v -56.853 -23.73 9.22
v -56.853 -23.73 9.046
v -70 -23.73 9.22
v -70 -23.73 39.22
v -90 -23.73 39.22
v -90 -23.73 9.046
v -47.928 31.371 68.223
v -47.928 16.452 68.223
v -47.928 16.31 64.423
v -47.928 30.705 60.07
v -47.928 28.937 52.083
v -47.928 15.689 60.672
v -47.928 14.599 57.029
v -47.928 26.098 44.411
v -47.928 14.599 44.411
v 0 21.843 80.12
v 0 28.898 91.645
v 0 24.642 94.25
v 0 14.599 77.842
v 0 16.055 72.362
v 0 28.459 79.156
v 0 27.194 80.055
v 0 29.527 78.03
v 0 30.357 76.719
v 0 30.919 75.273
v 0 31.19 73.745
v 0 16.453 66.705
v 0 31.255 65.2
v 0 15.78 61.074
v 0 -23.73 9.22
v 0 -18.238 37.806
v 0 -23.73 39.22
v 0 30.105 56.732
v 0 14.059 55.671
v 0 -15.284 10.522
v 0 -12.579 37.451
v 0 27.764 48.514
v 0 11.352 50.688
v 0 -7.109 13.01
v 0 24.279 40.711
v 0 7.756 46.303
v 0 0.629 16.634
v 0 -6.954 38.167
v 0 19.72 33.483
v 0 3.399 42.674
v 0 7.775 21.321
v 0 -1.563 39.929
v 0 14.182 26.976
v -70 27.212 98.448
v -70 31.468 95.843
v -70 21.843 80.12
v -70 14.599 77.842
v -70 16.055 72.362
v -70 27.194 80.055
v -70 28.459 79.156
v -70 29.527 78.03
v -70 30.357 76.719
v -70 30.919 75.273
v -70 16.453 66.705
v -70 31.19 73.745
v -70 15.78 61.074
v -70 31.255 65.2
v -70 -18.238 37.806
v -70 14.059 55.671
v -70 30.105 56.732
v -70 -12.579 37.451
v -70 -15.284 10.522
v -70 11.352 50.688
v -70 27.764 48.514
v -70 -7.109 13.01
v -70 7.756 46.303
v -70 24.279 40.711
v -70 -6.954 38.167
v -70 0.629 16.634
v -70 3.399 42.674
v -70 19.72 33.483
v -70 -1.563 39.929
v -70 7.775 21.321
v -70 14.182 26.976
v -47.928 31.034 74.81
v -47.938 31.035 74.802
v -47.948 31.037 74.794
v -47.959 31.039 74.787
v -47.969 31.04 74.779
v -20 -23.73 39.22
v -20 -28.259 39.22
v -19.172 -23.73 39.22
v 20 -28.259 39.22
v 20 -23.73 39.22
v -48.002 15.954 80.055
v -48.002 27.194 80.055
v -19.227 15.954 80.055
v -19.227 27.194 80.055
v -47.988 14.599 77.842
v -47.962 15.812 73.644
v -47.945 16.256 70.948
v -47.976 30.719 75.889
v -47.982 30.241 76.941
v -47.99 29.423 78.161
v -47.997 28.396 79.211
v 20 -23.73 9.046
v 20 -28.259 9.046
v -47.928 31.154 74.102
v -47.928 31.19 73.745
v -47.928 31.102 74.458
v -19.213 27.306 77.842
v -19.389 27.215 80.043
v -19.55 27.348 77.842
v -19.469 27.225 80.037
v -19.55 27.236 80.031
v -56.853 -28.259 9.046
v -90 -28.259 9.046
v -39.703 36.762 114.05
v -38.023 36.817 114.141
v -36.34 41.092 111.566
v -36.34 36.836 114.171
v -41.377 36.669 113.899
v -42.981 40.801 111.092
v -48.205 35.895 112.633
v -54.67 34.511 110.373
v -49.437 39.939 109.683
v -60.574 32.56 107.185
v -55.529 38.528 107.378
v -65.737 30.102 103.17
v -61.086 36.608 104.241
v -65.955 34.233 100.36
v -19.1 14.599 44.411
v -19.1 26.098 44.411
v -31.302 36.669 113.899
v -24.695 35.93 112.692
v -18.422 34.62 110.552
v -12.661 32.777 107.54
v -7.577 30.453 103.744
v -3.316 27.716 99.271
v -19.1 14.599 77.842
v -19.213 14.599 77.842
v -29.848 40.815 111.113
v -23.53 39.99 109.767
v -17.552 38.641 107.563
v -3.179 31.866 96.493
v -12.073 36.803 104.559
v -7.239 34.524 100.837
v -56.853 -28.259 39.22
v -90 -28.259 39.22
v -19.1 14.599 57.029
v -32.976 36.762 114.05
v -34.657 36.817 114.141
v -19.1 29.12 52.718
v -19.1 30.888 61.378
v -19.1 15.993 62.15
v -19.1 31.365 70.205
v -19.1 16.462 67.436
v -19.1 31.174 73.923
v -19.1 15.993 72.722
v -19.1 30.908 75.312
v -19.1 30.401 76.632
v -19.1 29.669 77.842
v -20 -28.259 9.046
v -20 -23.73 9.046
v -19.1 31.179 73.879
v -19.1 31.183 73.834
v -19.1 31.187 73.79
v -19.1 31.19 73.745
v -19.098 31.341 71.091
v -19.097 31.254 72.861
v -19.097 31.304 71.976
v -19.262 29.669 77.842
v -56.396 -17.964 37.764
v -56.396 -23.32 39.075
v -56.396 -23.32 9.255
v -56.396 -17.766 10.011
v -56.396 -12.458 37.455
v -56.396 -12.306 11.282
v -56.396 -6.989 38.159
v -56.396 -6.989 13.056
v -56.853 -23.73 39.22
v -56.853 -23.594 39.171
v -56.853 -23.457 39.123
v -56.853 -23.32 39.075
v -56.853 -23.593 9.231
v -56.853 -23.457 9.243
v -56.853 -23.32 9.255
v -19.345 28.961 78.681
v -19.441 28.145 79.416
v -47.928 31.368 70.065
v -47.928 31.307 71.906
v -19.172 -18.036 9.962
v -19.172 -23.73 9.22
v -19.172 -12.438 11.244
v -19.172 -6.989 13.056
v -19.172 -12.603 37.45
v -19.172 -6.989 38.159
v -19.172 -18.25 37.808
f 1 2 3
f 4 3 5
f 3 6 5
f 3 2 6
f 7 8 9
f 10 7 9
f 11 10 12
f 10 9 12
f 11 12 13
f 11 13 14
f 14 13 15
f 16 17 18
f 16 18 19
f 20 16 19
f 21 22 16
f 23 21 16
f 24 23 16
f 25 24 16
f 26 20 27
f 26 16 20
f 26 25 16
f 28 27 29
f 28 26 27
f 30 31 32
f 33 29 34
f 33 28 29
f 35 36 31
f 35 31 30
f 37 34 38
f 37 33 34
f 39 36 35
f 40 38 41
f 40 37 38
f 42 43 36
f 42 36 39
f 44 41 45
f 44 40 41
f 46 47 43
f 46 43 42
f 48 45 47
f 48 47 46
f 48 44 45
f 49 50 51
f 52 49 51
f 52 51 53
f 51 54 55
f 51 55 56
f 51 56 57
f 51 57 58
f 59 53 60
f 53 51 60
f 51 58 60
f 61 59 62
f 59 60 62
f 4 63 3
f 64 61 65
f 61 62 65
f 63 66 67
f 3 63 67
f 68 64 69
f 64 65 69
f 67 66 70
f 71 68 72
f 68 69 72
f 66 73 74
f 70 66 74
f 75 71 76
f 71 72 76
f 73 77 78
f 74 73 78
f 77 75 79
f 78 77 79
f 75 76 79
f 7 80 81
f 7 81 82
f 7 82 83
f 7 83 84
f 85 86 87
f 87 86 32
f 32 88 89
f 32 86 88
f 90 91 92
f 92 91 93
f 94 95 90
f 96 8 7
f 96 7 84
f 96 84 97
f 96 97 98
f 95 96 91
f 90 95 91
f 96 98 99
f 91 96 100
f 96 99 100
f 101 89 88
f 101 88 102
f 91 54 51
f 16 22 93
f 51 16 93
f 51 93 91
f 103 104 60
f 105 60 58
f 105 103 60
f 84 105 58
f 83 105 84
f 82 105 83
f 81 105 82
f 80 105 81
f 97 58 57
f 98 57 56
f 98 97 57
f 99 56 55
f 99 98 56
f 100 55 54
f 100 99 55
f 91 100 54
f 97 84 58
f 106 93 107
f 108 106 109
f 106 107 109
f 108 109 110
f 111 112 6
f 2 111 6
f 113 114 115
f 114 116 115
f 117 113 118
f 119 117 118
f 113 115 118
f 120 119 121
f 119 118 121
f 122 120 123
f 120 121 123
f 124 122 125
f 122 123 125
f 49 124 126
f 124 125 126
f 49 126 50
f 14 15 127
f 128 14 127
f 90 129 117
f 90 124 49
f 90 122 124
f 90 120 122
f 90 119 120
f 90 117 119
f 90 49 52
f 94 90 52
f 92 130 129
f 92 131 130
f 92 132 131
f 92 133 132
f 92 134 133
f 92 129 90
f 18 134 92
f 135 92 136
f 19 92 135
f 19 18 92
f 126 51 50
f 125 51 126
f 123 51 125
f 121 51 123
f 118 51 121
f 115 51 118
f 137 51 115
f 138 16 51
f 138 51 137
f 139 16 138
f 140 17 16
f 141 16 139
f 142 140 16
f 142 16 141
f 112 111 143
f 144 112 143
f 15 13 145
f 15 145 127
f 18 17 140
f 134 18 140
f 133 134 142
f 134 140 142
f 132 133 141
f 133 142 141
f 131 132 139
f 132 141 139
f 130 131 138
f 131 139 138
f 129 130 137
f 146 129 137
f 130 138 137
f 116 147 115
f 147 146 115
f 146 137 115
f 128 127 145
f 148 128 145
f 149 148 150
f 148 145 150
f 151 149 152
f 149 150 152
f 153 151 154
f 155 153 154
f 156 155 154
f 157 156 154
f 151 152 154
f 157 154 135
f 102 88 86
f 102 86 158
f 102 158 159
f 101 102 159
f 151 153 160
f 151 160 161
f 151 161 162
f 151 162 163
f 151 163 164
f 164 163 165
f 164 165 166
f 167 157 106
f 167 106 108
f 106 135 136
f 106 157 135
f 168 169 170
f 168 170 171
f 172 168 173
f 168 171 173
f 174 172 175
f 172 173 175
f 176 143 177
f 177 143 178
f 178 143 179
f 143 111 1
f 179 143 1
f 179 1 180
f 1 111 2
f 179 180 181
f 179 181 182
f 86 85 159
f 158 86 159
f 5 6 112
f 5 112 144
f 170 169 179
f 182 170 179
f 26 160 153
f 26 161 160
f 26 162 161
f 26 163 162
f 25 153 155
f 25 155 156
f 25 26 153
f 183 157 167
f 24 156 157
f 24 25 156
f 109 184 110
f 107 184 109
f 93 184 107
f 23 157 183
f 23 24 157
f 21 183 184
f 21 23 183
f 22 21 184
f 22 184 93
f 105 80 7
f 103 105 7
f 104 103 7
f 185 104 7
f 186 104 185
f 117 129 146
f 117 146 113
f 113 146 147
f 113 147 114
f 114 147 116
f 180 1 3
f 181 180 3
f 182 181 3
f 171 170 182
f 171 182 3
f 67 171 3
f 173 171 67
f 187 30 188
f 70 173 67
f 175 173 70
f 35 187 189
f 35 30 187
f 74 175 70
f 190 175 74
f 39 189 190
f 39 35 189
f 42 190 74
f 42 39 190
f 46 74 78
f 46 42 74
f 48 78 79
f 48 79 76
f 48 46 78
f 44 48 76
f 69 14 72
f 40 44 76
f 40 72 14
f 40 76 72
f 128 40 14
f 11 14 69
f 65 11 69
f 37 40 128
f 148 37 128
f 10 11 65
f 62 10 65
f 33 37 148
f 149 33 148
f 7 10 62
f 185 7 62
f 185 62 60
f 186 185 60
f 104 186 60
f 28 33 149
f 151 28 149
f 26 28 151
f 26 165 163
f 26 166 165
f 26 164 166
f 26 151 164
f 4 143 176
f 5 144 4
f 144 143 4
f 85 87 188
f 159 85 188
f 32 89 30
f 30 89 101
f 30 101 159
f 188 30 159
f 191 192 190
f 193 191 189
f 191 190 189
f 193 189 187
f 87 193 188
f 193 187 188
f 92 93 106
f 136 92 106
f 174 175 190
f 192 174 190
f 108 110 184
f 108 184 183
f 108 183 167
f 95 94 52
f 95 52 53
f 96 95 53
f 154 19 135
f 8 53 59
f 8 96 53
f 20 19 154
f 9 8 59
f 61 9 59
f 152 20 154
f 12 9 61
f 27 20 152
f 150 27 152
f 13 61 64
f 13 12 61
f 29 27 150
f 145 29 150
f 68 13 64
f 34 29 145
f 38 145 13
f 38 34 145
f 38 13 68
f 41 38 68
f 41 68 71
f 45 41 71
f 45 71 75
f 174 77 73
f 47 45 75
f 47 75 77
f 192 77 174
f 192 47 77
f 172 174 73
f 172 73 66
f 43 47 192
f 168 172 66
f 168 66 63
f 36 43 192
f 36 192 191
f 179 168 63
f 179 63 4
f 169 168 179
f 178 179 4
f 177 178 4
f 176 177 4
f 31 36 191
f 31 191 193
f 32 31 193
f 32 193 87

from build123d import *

# Parameters (mm, degrees)
BOSS_EXTRUDE4_DEPTH      = 70
CUT_EXTRUDE7_DEPTH       = 70
CUT_EXTRUDE8_DEPTH       = 70
CUT_EXTRUDE9_DEPTH       = 70
CUT_EXTRUDE10_DEPTH      = 70
SKETCH9_W                = 19.742548684
SKETCH9_H                = 10.626968924
CUT_EXTRUDE11_DEPTH      = 70
SKETCH10_W               = 30.173725447
SKETCH10_H               = 4.529281074
BOSS_EXTRUDE6_DEPTH      = 20
BOSS_EXTRUDE6_DEPTH_BACK = 20
SKETCH11_W               = 30.173725447
SKETCH11_H               = 4.529281074
BOSS_EXTRUDE7_DEPTH      = 20
BOSS_EXTRUDE7_DEPTH_BACK = 20
SKETCH12_W               = 12.373535054
SKETCH12_H               = 7.384206403
CUT_EXTRUDE12_DEPTH      = 60


with BuildPart() as part:
    # Sketch1 → Boss-Extrude4 (new body)
    with BuildSketch(Plane(origin=(0, 0, 0), x_dir=(0, 0, -1), z_dir=(1, 0, 0))):
        with BuildLine():
            Line((-39.22009442, -23.730076692), (-9.22009442, -23.730076692))
            ThreePointArc((-9.22009442, -23.730076692), (-30.130831643, 17.067070654), (-73.745048282, 31.190323456))
            ThreePointArc((-73.745048282, 31.190323456), (-77.395108799, 29.973959621), (-80.055244789, 27.19436266))
            Line((-80.055244789, 27.19436266), (-80.119694314, 21.843458315))
            Line((-80.119694314, 21.843458315), (-111.566080144, 41.091665162))
            ThreePointArc((-111.566080144, 41.091665162), (-114.864867075, 40.185656866), (-114.171074211, 36.835806464))
            Line((-114.171074211, 36.835806464), (-113.899114734, 36.669341157))
            Line((-113.899114734, 36.669341157), (-77.842344496, 14.599136476))
            ThreePointArc((-77.842344496, 14.599136476), (-46.303479727, 7.755753907), (-39.22009442, -23.730076692))
        make_face()
    extrude(amount=-BOSS_EXTRUDE4_DEPTH)

    # Sketch7 → Cut-Extrude7 (cut)
    with BuildSketch(Plane(origin=(0, -19.784860197, 12.110233703), x_dir=(1, 0, 0), z_dir=(0, 0.8529078546066994, -0.5220614825384052))):
        Polygon((-70, -137.087313056), (0, -134.019745414), (0, -116.607961697), (-70, -116.607961697), align=None)
        with BuildLine():
            Line((0, -116.607961697), (0, -93.251406208))
            ThreePointArc((0, -93.251406208), (-14.740425592, -110.265300978), (-36.339578744, -116.607961697))
            Line((-36.339578744, -116.607961697), (0, -116.607961697))
        make_face()
        with BuildLine():
            Line((-70, -116.607961697), (-36.339578744, -116.607961697))
            ThreePointArc((-36.339578744, -116.607961697), (-55.528547719, -111.697453308), (-70, -98.173153259))
            Line((-70, -98.173153259), (-70, -116.607961697))
        make_face()
    extrude(amount=-CUT_EXTRUDE7_DEPTH, mode=Mode.SUBTRACT)

    # 3DSketch2 → Cut-Extrude8 (cut)
    with BuildSketch(Plane(origin=(-19.171968763, -23.730076692, 9.22009442), x_dir=(-0.9120096253806464, 0.410168798439195, 0), z_dir=(0, 0, 1))):
        Polygon((0, 0), (33.948715461, 15.26815446), (40.815441858, 0), (6.866726397, -15.26815446), align=None)
    extrude(amount=CUT_EXTRUDE8_DEPTH, mode=Mode.SUBTRACT)

    # 3DSketch3 → Cut-Extrude9 (cut)
    with BuildSketch(Plane(origin=(-47.927611425, 14.599136476, 77.842344496), x_dir=(0.6530368290826427, 0, -0.7573261515765103), z_dir=(0, -1, 0))):
        Polygon((0, 0), (25.318083545, -21.831599189), (44.143312647, 0), (18.825229102, 21.831599189), align=None)
    extrude(amount=-CUT_EXTRUDE9_DEPTH, mode=Mode.SUBTRACT)

    # 3DSketch4 → Cut-Extrude10 (cut, along a direction that is not the sketch's normal)
    with BuildSketch(Plane(origin=(-19.22654119, 27.19436266, 80.055244789), x_dir=(-0.9162575030272925, 0.13334663681048042, -0.37774444085588477), z_dir=(0.12328082078814585, 0.9910694599529005, 0.050824844067318485))):
        Polygon((0, 0), (4.481258703, -10.967695522), (31.324240337, 0), (26.842981633, 10.967695522), align=None)
    extrude(amount=-CUT_EXTRUDE10_DEPTH, dir=(0, 1, 0), mode=Mode.SUBTRACT)

    # Sketch9 → Cut-Extrude11 (cut)
    with BuildSketch(Plane(origin=(3.531999691, 28.394173594, 1.456133504), x_dir=(-0.9923718250866462, 0.12311902997688387, 0.006313891965344148), z_dir=(-0.12328082078814556, -0.9910694599529005, -0.05082484406731809))):
        with Locations((33.130862907, -73.819623484)):
            Rectangle(SKETCH9_W, SKETCH9_H)
    extrude(amount=-CUT_EXTRUDE11_DEPTH, mode=Mode.SUBTRACT)

    # Sketch10 → Boss-Extrude6 (add, two sides)
    with BuildSketch(Plane(origin=(0, 0, 0), x_dir=(0, 0, -1), z_dir=(1, 0, 0))) as boss_extrude6_sk:
        with Locations((-24.133231697, -25.994717229)):
            Rectangle(SKETCH10_W, SKETCH10_H)
    extrude(amount=BOSS_EXTRUDE6_DEPTH)
    extrude(boss_extrude6_sk.sketch, amount=-BOSS_EXTRUDE6_DEPTH_BACK)

    # Sketch11 → Boss-Extrude7 (add, two sides)
    with BuildSketch(Plane.ZY.offset(70)) as boss_extrude7_sk:
        with Locations((24.133231697, -25.994717229)):
            Rectangle(SKETCH11_W, SKETCH11_H)
    extrude(amount=BOSS_EXTRUDE7_DEPTH)
    extrude(boss_extrude7_sk.sketch, amount=-BOSS_EXTRUDE7_DEPTH_BACK)

    # Sketch12 → Cut-Extrude12 (cut)
    with BuildSketch(Plane(origin=(0, 0, 9.046368973), x_dir=(-1, 0, 0), z_dir=(0, 0, -1))):
        with Locations((50.666491964, -27.012348263)):
            Rectangle(SKETCH12_W, SKETCH12_H)
    extrude(amount=-CUT_EXTRUDE12_DEPTH, mode=Mode.SUBTRACT)


solid = part.part
